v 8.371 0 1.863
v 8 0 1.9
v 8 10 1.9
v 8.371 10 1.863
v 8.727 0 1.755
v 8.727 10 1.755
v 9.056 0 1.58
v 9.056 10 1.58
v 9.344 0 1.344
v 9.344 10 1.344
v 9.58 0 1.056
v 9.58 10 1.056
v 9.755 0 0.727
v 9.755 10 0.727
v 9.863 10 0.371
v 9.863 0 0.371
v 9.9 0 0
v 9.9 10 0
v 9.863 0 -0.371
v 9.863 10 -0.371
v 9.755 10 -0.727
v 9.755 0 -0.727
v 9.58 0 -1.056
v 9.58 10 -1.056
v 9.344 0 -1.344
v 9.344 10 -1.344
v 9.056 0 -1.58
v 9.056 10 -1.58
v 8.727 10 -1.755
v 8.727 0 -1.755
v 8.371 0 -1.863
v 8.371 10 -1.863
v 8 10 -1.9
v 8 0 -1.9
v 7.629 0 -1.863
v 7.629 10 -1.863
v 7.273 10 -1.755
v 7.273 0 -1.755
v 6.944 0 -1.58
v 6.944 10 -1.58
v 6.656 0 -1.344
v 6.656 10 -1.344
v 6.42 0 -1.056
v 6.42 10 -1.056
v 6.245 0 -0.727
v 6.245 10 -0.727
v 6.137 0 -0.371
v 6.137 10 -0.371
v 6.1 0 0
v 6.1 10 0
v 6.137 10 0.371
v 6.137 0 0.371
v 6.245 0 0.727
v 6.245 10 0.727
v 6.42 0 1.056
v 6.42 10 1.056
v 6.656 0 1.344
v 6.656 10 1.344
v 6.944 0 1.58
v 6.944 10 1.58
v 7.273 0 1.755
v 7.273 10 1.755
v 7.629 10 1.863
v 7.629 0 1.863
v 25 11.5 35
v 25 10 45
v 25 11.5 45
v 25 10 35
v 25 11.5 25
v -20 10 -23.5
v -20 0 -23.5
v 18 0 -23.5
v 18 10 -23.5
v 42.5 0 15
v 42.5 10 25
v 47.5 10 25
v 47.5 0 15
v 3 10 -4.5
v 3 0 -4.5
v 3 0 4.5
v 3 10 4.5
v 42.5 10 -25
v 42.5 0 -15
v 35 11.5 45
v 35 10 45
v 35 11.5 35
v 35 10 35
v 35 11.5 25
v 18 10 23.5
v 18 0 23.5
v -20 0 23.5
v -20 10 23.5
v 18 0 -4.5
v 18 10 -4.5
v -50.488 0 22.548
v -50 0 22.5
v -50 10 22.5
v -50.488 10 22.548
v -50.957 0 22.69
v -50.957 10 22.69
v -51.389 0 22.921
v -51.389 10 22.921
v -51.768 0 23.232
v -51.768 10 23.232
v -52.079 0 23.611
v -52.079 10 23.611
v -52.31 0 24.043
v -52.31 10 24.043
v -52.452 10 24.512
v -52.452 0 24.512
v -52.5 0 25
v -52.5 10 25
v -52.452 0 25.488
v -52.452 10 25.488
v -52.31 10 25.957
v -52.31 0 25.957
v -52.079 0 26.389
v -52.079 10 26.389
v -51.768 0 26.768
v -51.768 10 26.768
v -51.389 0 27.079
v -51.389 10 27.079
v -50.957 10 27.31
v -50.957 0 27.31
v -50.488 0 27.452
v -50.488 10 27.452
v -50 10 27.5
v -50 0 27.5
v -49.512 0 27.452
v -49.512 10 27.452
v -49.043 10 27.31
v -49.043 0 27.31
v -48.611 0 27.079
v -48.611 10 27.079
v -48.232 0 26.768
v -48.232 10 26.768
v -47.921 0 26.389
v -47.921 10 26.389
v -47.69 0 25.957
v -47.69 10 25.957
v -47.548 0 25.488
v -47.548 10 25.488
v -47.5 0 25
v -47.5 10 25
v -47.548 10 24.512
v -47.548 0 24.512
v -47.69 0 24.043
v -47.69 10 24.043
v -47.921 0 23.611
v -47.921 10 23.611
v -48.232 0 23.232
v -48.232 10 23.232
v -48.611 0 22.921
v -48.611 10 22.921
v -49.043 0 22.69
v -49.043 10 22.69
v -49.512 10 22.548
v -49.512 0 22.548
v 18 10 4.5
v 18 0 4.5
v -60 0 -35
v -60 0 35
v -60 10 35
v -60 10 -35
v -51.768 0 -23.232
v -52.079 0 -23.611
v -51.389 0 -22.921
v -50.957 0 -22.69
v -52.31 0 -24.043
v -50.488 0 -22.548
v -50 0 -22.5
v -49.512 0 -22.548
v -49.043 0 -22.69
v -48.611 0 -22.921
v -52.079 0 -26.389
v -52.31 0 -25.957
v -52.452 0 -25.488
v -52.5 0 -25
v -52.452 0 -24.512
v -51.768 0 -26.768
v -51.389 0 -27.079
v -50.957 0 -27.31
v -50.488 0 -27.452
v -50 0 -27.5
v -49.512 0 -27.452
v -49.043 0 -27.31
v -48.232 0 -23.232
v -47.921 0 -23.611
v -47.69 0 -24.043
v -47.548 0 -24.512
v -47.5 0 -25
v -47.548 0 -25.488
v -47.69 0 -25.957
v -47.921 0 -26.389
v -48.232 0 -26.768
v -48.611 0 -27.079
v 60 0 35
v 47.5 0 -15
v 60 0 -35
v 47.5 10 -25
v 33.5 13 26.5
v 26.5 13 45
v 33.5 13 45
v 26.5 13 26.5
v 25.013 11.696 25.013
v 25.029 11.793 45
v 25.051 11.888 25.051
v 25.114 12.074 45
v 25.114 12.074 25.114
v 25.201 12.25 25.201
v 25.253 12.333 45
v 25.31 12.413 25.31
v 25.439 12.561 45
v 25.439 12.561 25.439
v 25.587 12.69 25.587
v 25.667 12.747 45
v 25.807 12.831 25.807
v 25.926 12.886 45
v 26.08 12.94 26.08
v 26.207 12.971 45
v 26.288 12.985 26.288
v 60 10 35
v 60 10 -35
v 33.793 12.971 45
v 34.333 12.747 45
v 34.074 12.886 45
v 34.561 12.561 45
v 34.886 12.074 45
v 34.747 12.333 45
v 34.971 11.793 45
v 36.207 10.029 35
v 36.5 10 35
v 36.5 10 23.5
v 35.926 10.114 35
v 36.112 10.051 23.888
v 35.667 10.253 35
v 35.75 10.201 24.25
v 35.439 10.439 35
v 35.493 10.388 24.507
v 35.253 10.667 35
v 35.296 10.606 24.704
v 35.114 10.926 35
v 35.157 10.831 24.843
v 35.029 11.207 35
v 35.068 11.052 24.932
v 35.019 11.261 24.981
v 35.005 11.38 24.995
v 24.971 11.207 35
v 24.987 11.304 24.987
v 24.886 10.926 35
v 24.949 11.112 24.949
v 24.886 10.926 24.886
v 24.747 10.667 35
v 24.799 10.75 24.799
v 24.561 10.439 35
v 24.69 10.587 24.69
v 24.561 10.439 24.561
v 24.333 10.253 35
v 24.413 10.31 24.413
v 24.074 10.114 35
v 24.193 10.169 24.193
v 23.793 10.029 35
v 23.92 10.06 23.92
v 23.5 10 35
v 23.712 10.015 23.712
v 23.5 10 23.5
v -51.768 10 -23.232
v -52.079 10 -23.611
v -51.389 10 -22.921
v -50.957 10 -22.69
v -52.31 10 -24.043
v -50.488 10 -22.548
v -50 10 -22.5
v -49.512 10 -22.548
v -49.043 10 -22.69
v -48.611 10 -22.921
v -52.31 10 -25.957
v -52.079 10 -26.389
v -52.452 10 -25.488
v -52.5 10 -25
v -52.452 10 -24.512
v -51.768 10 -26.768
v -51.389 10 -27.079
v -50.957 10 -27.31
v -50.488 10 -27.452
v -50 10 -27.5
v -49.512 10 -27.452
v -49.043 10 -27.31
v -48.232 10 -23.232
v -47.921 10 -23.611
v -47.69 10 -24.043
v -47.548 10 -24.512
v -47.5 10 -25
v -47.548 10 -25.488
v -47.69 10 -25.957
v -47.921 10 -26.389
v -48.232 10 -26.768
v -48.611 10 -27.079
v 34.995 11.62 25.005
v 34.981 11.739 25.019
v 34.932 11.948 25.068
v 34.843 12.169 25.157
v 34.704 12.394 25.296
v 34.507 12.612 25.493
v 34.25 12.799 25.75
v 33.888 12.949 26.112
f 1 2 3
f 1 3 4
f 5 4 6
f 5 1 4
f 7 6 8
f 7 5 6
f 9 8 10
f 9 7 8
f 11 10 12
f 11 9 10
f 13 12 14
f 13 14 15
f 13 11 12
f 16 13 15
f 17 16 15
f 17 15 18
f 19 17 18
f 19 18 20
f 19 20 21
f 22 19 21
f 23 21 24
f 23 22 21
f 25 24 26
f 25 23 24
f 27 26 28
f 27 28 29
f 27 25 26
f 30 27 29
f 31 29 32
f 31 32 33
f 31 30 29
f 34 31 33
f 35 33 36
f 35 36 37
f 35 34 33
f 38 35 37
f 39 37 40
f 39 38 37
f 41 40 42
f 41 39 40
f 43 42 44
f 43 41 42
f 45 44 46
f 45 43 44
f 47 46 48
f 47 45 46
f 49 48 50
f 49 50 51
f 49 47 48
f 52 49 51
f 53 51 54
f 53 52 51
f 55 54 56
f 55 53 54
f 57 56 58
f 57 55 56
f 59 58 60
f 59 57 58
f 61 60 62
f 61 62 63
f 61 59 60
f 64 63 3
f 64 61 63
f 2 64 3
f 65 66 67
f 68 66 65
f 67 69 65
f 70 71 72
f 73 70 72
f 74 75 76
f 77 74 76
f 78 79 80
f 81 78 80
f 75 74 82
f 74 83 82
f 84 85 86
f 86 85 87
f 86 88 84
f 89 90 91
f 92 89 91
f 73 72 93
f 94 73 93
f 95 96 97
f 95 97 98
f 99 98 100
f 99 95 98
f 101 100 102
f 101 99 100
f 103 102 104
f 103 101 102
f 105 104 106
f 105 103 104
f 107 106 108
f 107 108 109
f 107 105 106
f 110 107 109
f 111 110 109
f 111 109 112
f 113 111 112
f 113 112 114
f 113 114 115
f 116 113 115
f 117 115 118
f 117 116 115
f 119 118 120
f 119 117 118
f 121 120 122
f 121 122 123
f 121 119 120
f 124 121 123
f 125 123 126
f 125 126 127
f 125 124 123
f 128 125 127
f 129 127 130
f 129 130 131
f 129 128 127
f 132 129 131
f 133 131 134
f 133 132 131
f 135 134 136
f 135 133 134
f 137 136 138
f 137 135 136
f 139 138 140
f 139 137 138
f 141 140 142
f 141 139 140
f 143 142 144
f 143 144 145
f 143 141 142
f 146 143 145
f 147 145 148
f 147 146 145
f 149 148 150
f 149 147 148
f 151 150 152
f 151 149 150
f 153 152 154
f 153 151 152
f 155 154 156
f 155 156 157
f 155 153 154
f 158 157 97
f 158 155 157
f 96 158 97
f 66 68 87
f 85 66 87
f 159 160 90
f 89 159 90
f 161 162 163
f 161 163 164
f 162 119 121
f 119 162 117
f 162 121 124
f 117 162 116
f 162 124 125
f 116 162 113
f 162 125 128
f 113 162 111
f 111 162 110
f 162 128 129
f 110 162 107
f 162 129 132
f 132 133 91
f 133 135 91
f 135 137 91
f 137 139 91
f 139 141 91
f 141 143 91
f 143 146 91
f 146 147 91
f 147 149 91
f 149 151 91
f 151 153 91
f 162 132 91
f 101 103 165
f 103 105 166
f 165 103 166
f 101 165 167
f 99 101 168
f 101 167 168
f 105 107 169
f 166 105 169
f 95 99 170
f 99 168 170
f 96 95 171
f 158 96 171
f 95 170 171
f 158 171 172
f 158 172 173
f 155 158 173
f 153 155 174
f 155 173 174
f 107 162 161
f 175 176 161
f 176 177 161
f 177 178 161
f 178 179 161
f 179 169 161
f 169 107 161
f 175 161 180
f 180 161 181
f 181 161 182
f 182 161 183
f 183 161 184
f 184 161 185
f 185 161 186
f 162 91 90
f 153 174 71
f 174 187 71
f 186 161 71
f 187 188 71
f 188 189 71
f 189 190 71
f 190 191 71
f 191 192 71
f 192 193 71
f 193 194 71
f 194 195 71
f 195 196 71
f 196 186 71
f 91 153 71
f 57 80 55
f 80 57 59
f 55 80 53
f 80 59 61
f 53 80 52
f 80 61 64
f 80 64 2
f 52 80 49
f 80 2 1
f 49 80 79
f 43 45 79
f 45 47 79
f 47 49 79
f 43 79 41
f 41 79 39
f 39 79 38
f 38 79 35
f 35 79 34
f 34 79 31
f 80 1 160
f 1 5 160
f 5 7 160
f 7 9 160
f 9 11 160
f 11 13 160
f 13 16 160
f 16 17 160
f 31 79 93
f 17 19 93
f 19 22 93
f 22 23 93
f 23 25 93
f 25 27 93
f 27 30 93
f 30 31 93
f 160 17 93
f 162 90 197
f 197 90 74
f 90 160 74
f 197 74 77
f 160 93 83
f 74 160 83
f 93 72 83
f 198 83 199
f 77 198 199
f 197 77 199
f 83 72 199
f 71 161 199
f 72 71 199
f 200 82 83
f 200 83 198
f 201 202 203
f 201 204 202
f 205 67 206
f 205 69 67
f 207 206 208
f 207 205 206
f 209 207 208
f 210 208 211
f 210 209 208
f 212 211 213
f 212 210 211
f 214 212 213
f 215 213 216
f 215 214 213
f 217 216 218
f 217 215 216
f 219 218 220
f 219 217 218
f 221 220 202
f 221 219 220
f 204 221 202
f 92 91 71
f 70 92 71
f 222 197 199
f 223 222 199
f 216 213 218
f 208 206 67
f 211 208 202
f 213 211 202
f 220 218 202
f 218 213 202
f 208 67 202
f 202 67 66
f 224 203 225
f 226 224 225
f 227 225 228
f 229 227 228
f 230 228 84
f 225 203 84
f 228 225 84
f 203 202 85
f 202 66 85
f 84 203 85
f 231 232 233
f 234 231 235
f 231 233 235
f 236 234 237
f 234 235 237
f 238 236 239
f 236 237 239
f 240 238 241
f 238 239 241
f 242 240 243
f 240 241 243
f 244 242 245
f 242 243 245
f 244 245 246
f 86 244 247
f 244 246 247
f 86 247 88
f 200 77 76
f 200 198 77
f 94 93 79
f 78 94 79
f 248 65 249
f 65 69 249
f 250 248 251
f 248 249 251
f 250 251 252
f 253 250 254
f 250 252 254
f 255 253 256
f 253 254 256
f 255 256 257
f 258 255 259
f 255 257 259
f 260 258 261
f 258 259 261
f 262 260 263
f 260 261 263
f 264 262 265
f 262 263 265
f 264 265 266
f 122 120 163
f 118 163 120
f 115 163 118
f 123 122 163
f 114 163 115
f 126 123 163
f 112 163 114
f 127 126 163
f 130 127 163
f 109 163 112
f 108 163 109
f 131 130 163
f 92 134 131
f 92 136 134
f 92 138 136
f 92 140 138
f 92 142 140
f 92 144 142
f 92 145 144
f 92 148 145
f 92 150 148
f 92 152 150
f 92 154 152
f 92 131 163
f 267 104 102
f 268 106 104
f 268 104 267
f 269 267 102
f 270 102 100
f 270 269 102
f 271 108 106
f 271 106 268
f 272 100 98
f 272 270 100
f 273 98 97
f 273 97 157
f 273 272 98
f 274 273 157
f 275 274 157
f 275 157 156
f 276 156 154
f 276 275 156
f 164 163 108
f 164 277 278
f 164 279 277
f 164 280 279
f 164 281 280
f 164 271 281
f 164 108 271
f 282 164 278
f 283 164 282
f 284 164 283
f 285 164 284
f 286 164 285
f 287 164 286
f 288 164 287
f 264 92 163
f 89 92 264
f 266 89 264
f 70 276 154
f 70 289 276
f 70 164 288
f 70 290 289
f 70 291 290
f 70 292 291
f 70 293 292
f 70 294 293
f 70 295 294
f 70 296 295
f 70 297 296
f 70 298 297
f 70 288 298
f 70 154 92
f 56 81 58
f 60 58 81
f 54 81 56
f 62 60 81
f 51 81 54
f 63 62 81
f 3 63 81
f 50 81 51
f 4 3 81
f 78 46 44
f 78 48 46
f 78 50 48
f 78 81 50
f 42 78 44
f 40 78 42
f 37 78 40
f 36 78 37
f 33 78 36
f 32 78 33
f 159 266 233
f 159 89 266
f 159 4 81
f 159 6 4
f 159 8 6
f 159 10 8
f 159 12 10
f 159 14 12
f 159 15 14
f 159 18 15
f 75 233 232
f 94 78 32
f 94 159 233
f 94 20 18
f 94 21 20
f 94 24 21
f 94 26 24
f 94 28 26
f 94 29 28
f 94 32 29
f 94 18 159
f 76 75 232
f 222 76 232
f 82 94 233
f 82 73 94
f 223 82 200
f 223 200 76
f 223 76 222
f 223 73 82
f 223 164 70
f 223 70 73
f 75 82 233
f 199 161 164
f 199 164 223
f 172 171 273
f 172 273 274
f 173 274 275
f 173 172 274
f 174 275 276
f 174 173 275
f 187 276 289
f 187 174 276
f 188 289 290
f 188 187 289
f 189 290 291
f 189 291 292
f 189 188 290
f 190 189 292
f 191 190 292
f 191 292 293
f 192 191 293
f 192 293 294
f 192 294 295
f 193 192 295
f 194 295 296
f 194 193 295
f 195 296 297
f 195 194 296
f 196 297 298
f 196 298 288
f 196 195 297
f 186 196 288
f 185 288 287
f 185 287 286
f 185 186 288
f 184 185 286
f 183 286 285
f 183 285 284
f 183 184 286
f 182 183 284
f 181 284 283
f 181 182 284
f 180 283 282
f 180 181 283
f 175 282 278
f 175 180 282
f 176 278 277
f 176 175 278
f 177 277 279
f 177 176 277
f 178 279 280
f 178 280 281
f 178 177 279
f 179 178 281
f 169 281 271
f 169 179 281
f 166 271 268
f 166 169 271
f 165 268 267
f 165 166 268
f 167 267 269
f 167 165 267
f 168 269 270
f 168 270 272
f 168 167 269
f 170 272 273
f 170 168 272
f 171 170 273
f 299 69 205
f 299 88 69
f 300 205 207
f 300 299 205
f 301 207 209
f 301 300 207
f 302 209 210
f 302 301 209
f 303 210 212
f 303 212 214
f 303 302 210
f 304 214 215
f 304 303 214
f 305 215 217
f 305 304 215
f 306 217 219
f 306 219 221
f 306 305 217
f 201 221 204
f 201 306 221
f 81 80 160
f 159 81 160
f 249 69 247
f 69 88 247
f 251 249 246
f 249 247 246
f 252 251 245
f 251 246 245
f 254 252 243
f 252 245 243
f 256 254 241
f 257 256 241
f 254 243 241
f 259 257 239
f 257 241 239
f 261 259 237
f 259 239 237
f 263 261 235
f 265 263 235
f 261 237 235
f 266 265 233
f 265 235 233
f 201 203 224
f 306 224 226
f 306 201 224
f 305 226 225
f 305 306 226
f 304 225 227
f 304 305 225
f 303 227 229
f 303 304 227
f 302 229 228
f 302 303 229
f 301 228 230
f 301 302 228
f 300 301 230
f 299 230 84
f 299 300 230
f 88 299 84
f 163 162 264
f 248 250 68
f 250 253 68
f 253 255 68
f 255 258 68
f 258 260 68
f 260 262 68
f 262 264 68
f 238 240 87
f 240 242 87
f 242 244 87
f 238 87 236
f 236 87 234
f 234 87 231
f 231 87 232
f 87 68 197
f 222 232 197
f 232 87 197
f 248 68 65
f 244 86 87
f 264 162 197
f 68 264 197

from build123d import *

# Parameters (mm, degrees)
SKETCH1_W           = 120
SKETCH1_H           = 70
SKETCH1_R           = 2.5
SKETCH1_R_2         = 1.9
SKETCH1_W_2         = 5
SKETCH1_H_2         = 30
BOSS_EXTRUDE1_DEPTH = 10
CHAMFER1_SIZE       = 10
SKETCH3_W           = 10
SKETCH3_H           = 20
BOSS_EXTRUDE2_DEPTH = 3
FILLET1_R           = 1.5


with BuildPart() as part:
    # Sketch1 → Boss-Extrude1 (new body)
    with BuildSketch(Plane(origin=(0, 0, 0), x_dir=(1, 0, 0), z_dir=(0, 1, 0))):
        Rectangle(SKETCH1_W, SKETCH1_H)
        with Locations(Location((-50, 25, 0), (0, 0, 270))):
            Circle(SKETCH1_R, mode=Mode.SUBTRACT)
        with Locations(Location((-50, -25, 0), (0, 0, 90))):
            Circle(SKETCH1_R, mode=Mode.SUBTRACT)
        with Locations(Location((8, 0, 0), (0, 0, 270))):
            Circle(SKETCH1_R_2, mode=Mode.SUBTRACT)
        Polygon((18, 23.5), (18, 4.5), (3, 4.5), (3, -4.5), (18, -4.5), (18, -23.5), (-20, -23.5), (-20, 23.5), align=None, mode=Mode.SUBTRACT)
        with Locations((45, 0)):
            Rectangle(SKETCH1_W_2, SKETCH1_H_2, mode=Mode.SUBTRACT)
    extrude(amount=BOSS_EXTRUDE1_DEPTH)

    # Chamfer1
    chamfer1_edges = [part.edges().sort_by_distance(p)[0] for p in [
        (45, 10, 15),
        (45, 10, -15),
    ]]
    chamfer(chamfer1_edges, length=CHAMFER1_SIZE - 0.0001)  # a hair under: the kernel refuses the full size

    # Sketch3 → Boss-Extrude2 (add)
    with BuildSketch(Plane(origin=(0, 10, 0), x_dir=(1, 0, 0), z_dir=(0, 1, 0))):
        with Locations((30, -35)):
            Rectangle(SKETCH3_W, SKETCH3_H)
    extrude(amount=BOSS_EXTRUDE2_DEPTH)

    # Fillet1
    fillet1_edges = [part.edges().sort_by_distance(p)[0] for p in [
        (25, 13, 35),
        (35, 13, 35),
        (30, 13, 25),
        (35, 10, 30),
        (30, 10, 25),
        (25, 10, 30),
    ]]
    fillet(fillet1_edges, radius=FILLET1_R - 0.0001)  # a hair under: the kernel refuses the full size


solid = part.part
